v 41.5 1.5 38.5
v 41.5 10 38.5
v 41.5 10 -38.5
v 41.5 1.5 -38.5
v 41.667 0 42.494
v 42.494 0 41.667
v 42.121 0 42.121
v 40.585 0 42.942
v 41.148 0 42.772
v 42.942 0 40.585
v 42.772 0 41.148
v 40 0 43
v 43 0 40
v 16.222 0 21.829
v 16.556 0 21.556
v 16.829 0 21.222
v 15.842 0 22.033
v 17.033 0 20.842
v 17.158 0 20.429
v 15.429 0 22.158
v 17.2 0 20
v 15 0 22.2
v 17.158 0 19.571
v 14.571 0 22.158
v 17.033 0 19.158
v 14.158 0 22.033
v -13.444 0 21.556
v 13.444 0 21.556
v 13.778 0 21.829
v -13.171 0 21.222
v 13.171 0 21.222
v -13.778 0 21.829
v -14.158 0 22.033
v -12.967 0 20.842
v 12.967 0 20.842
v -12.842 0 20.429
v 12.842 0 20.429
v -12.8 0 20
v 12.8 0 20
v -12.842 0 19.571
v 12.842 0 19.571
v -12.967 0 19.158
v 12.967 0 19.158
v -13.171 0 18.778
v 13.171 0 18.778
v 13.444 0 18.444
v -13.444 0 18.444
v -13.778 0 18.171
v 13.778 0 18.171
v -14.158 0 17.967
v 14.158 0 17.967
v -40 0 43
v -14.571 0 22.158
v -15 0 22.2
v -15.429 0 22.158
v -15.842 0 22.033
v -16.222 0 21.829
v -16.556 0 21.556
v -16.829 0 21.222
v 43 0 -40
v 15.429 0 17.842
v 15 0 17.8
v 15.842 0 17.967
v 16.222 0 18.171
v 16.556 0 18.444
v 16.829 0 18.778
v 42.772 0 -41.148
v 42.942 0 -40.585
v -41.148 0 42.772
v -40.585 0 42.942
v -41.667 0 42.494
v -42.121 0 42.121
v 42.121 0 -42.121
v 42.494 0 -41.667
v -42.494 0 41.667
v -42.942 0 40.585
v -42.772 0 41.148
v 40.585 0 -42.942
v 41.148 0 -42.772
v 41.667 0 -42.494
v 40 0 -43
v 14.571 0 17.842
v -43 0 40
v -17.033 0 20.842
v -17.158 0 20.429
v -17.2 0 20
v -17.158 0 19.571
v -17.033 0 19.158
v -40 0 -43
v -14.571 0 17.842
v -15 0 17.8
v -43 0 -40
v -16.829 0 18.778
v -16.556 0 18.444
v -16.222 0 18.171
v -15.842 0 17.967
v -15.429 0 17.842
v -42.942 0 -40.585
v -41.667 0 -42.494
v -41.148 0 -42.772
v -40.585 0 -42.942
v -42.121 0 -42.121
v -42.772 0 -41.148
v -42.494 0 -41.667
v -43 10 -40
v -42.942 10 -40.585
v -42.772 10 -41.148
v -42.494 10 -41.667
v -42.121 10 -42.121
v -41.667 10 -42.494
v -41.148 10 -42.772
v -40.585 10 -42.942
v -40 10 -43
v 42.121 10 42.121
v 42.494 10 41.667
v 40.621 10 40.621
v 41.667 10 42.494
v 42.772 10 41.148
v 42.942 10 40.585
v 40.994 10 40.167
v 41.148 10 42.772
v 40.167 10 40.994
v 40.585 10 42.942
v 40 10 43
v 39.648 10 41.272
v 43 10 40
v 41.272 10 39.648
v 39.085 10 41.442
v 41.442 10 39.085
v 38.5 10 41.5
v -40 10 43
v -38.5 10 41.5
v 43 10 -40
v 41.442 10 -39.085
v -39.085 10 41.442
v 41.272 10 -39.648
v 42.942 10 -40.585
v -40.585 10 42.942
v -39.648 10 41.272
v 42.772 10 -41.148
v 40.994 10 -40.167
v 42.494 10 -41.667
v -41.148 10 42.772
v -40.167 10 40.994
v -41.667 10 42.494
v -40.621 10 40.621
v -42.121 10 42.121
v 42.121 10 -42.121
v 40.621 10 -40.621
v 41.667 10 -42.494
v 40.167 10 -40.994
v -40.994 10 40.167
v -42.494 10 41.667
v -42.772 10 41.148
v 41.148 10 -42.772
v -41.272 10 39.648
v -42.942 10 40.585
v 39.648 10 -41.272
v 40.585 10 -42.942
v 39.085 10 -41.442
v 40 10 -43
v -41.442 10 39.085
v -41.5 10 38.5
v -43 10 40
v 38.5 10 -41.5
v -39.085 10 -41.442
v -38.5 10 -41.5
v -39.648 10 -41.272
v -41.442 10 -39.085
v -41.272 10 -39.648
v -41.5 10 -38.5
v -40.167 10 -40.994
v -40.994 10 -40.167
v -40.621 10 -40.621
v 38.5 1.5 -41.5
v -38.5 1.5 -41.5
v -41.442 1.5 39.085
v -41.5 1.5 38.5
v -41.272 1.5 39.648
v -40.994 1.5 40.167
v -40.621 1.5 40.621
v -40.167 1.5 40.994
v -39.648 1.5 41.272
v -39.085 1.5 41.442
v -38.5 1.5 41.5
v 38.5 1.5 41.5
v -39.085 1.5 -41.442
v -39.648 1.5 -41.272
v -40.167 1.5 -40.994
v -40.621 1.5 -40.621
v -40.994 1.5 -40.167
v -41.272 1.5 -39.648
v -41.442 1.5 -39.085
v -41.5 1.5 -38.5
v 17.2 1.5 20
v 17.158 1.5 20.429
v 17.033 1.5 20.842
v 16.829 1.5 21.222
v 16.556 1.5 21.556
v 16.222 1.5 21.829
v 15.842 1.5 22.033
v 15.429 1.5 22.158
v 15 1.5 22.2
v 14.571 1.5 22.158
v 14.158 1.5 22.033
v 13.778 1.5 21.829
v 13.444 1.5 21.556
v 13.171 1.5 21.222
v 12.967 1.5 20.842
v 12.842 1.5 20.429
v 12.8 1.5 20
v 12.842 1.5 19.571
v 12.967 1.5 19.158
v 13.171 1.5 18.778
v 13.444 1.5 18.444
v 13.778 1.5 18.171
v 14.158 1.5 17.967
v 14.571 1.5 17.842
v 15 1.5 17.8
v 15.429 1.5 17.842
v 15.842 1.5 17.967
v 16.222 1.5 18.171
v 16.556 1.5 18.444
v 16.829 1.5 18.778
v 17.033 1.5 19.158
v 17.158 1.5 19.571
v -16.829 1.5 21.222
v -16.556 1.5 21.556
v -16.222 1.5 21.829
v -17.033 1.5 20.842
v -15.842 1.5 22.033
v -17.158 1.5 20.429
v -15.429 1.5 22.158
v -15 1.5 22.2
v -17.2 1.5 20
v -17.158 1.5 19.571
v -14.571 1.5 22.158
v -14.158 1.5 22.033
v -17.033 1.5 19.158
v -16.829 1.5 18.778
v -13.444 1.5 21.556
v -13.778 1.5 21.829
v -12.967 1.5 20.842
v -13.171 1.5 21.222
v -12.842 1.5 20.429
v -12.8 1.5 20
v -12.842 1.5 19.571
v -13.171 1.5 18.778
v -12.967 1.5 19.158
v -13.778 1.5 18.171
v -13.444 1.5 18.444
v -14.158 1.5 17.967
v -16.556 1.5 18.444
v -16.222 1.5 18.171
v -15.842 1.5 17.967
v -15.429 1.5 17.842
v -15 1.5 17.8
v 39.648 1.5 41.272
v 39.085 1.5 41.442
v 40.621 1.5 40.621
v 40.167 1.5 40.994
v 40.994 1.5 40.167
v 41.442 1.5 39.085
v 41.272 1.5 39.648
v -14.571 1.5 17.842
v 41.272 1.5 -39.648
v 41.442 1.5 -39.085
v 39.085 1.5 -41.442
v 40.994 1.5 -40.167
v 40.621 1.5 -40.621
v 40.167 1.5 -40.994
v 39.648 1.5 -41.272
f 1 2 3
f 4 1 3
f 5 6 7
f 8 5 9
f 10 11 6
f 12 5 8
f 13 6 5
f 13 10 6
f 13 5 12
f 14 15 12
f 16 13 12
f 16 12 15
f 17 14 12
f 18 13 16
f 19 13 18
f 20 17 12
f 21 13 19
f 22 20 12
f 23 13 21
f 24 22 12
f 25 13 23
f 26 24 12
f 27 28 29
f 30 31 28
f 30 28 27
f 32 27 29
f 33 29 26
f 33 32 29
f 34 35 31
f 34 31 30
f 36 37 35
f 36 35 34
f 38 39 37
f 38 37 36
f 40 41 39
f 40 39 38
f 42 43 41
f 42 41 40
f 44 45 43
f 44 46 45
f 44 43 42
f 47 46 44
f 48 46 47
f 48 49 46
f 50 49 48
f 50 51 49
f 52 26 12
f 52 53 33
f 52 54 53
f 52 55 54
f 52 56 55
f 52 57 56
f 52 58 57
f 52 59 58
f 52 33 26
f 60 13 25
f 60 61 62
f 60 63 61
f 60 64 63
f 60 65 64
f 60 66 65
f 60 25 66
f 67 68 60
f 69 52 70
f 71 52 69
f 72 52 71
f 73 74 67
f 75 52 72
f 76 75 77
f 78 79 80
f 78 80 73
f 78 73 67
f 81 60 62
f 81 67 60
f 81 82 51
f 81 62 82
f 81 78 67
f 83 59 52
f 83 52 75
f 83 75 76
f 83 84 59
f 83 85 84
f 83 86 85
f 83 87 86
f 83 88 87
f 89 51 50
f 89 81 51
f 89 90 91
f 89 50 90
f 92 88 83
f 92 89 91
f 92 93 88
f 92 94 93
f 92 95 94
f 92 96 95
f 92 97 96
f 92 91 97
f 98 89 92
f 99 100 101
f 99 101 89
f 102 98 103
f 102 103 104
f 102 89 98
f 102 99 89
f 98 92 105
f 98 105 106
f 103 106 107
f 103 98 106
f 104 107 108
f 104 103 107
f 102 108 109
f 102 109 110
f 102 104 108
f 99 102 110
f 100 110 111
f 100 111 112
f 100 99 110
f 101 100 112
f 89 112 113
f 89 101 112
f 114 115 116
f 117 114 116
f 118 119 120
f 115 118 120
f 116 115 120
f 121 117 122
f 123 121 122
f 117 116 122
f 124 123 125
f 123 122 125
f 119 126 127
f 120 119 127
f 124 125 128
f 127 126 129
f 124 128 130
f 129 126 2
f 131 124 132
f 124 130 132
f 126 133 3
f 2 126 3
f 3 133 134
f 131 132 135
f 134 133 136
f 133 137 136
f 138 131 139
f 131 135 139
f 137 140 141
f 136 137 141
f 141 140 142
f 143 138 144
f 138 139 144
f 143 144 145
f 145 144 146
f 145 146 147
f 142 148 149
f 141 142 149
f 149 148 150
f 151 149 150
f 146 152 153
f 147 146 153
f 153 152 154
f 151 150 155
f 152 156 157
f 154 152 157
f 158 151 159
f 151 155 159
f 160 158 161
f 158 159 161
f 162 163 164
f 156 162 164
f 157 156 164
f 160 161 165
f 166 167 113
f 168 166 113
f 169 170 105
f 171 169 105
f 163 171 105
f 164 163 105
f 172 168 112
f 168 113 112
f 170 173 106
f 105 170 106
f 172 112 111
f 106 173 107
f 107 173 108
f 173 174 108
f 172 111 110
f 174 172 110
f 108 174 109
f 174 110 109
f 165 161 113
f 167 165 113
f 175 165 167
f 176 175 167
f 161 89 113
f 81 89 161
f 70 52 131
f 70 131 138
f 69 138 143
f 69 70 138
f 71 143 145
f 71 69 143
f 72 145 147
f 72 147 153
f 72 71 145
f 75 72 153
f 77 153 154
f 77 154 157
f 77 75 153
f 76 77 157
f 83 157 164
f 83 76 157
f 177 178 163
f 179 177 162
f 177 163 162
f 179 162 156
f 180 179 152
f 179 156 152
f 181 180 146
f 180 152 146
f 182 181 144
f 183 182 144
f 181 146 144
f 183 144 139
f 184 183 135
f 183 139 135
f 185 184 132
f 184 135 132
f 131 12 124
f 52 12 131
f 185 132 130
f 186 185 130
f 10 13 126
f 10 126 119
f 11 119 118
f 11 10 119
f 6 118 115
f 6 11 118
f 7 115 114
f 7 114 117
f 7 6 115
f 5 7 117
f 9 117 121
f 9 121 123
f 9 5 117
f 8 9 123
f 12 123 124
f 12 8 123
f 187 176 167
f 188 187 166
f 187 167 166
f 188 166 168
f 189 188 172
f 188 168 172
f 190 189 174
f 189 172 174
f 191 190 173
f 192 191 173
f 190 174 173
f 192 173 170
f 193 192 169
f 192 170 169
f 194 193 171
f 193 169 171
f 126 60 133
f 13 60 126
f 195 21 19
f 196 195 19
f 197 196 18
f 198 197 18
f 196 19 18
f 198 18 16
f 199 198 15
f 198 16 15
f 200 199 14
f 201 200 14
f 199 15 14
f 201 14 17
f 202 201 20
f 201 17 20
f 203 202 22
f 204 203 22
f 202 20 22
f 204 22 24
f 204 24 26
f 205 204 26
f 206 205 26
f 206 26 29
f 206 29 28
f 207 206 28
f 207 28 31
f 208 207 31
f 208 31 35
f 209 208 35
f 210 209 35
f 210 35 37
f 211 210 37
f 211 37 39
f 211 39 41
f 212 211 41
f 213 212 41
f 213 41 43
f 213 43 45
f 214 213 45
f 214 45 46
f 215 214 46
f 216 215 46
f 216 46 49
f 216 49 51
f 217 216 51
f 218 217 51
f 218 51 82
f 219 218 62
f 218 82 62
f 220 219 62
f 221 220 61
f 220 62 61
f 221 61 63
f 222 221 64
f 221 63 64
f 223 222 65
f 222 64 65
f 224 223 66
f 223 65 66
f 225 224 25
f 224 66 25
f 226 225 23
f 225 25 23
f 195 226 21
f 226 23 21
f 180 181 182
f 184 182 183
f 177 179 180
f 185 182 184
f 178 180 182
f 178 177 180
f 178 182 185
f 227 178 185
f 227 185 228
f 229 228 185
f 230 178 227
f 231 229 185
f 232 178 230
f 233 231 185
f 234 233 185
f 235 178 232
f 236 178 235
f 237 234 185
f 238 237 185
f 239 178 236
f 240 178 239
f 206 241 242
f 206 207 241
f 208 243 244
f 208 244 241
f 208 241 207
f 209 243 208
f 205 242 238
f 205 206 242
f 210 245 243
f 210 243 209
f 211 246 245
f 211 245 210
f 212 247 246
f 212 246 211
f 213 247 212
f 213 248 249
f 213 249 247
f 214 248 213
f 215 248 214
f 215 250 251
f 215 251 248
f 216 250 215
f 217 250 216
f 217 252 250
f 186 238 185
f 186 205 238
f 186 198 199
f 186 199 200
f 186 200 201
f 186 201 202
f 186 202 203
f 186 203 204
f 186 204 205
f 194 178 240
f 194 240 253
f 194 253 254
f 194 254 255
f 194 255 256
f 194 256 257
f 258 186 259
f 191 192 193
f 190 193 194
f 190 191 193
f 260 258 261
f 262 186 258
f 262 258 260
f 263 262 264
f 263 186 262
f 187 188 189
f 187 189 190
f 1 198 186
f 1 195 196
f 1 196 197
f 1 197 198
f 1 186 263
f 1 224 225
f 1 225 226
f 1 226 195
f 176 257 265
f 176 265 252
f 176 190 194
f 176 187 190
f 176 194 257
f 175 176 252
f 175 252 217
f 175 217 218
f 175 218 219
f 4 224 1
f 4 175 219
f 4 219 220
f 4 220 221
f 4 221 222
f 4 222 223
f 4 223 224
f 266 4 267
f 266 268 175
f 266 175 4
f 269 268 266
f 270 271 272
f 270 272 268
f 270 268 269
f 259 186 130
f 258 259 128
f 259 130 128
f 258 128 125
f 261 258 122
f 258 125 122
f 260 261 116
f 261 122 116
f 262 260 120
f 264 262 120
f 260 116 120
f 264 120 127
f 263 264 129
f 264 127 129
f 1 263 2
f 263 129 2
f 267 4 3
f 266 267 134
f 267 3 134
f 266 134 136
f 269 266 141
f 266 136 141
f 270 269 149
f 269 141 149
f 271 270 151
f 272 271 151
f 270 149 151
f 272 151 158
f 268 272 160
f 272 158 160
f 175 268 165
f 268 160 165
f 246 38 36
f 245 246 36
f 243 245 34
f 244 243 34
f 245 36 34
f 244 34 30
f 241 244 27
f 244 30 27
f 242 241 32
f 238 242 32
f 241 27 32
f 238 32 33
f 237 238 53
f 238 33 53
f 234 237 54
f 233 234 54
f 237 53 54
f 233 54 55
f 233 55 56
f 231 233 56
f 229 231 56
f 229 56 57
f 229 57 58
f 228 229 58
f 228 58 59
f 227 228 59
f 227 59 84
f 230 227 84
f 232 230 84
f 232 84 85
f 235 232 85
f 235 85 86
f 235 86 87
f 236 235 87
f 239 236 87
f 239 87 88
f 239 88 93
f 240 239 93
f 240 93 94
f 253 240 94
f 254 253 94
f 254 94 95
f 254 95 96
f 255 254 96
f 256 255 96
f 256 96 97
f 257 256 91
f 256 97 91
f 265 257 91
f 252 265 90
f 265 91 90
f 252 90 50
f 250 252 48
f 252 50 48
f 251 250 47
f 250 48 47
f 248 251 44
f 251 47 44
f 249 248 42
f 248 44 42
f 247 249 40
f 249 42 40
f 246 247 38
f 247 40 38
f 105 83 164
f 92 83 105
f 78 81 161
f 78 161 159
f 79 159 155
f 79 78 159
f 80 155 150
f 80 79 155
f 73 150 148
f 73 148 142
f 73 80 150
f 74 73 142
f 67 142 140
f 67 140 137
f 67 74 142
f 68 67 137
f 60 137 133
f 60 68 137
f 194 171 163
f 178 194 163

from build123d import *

# Parameters (mm, degrees)
EXTRUDE_1_DEPTH     = 10
CUT_EXTRUDE_1_DEPTH = 8.5
SKETCH_3_R          = 2.2
CUT_EXTRUDE_2_DEPTH = 11


with BuildPart() as part:
    # Эскиз1 → Бобышка-Вытянуть1 (new body)
    with BuildSketch(Plane(origin=(0, 0, 0), x_dir=(1, 0, 0), z_dir=(0, 1, 0))):
        with BuildLine():
            Line((-40, 43), (40, 43))
            ThreePointArc((40, 43), (42.121320344, 42.121320344), (43, 40))
            Line((43, 40), (43, -40))
            ThreePointArc((43, -40), (42.121320344, -42.121320344), (40, -43))
            Line((40, -43), (-40, -43))
            ThreePointArc((-40, -43), (-42.121320344, -42.121320344), (-43, -40))
            Line((-43, -40), (-43, 40))
            ThreePointArc((-43, 40), (-42.121320344, 42.121320344), (-40, 43))
        make_face()
    extrude(amount=EXTRUDE_1_DEPTH)

    # Эскиз2 → Вырез-Вытянуть1 (cut)
    with BuildSketch(Plane(origin=(0, 10, 0), x_dir=(1, 0, 0), z_dir=(0, 1, 0))):
        with BuildLine():
            Line((-38.5, -41.5), (38.5, -41.5))
            ThreePointArc((38.5, -41.5), (40.621320344, -40.621320344), (41.5, -38.5))
            Line((41.5, -38.5), (41.5, 38.5))
            ThreePointArc((41.5, 38.5), (40.621320344, 40.621320344), (38.5, 41.5))
            Line((38.5, 41.5), (-38.5, 41.5))
            ThreePointArc((-38.5, 41.5), (-40.621320344, 40.621320344), (-41.5, 38.5))
            Line((-41.5, 38.5), (-41.5, -38.5))
            ThreePointArc((-41.5, -38.5), (-40.621320344, -40.621320344), (-38.5, -41.5))
        make_face()
    extrude(amount=-CUT_EXTRUDE_1_DEPTH, mode=Mode.SUBTRACT)

    # Эскиз3 → Вырез-Вытянуть2 (cut, through all)
    with BuildSketch(Plane.XZ):
        with Locations((-15, 20)):
            Circle(SKETCH_3_R)
        with Locations((15, 20)):
            Circle(SKETCH_3_R)
    extrude(amount=-CUT_EXTRUDE_2_DEPTH, mode=Mode.SUBTRACT)


solid = part.part
